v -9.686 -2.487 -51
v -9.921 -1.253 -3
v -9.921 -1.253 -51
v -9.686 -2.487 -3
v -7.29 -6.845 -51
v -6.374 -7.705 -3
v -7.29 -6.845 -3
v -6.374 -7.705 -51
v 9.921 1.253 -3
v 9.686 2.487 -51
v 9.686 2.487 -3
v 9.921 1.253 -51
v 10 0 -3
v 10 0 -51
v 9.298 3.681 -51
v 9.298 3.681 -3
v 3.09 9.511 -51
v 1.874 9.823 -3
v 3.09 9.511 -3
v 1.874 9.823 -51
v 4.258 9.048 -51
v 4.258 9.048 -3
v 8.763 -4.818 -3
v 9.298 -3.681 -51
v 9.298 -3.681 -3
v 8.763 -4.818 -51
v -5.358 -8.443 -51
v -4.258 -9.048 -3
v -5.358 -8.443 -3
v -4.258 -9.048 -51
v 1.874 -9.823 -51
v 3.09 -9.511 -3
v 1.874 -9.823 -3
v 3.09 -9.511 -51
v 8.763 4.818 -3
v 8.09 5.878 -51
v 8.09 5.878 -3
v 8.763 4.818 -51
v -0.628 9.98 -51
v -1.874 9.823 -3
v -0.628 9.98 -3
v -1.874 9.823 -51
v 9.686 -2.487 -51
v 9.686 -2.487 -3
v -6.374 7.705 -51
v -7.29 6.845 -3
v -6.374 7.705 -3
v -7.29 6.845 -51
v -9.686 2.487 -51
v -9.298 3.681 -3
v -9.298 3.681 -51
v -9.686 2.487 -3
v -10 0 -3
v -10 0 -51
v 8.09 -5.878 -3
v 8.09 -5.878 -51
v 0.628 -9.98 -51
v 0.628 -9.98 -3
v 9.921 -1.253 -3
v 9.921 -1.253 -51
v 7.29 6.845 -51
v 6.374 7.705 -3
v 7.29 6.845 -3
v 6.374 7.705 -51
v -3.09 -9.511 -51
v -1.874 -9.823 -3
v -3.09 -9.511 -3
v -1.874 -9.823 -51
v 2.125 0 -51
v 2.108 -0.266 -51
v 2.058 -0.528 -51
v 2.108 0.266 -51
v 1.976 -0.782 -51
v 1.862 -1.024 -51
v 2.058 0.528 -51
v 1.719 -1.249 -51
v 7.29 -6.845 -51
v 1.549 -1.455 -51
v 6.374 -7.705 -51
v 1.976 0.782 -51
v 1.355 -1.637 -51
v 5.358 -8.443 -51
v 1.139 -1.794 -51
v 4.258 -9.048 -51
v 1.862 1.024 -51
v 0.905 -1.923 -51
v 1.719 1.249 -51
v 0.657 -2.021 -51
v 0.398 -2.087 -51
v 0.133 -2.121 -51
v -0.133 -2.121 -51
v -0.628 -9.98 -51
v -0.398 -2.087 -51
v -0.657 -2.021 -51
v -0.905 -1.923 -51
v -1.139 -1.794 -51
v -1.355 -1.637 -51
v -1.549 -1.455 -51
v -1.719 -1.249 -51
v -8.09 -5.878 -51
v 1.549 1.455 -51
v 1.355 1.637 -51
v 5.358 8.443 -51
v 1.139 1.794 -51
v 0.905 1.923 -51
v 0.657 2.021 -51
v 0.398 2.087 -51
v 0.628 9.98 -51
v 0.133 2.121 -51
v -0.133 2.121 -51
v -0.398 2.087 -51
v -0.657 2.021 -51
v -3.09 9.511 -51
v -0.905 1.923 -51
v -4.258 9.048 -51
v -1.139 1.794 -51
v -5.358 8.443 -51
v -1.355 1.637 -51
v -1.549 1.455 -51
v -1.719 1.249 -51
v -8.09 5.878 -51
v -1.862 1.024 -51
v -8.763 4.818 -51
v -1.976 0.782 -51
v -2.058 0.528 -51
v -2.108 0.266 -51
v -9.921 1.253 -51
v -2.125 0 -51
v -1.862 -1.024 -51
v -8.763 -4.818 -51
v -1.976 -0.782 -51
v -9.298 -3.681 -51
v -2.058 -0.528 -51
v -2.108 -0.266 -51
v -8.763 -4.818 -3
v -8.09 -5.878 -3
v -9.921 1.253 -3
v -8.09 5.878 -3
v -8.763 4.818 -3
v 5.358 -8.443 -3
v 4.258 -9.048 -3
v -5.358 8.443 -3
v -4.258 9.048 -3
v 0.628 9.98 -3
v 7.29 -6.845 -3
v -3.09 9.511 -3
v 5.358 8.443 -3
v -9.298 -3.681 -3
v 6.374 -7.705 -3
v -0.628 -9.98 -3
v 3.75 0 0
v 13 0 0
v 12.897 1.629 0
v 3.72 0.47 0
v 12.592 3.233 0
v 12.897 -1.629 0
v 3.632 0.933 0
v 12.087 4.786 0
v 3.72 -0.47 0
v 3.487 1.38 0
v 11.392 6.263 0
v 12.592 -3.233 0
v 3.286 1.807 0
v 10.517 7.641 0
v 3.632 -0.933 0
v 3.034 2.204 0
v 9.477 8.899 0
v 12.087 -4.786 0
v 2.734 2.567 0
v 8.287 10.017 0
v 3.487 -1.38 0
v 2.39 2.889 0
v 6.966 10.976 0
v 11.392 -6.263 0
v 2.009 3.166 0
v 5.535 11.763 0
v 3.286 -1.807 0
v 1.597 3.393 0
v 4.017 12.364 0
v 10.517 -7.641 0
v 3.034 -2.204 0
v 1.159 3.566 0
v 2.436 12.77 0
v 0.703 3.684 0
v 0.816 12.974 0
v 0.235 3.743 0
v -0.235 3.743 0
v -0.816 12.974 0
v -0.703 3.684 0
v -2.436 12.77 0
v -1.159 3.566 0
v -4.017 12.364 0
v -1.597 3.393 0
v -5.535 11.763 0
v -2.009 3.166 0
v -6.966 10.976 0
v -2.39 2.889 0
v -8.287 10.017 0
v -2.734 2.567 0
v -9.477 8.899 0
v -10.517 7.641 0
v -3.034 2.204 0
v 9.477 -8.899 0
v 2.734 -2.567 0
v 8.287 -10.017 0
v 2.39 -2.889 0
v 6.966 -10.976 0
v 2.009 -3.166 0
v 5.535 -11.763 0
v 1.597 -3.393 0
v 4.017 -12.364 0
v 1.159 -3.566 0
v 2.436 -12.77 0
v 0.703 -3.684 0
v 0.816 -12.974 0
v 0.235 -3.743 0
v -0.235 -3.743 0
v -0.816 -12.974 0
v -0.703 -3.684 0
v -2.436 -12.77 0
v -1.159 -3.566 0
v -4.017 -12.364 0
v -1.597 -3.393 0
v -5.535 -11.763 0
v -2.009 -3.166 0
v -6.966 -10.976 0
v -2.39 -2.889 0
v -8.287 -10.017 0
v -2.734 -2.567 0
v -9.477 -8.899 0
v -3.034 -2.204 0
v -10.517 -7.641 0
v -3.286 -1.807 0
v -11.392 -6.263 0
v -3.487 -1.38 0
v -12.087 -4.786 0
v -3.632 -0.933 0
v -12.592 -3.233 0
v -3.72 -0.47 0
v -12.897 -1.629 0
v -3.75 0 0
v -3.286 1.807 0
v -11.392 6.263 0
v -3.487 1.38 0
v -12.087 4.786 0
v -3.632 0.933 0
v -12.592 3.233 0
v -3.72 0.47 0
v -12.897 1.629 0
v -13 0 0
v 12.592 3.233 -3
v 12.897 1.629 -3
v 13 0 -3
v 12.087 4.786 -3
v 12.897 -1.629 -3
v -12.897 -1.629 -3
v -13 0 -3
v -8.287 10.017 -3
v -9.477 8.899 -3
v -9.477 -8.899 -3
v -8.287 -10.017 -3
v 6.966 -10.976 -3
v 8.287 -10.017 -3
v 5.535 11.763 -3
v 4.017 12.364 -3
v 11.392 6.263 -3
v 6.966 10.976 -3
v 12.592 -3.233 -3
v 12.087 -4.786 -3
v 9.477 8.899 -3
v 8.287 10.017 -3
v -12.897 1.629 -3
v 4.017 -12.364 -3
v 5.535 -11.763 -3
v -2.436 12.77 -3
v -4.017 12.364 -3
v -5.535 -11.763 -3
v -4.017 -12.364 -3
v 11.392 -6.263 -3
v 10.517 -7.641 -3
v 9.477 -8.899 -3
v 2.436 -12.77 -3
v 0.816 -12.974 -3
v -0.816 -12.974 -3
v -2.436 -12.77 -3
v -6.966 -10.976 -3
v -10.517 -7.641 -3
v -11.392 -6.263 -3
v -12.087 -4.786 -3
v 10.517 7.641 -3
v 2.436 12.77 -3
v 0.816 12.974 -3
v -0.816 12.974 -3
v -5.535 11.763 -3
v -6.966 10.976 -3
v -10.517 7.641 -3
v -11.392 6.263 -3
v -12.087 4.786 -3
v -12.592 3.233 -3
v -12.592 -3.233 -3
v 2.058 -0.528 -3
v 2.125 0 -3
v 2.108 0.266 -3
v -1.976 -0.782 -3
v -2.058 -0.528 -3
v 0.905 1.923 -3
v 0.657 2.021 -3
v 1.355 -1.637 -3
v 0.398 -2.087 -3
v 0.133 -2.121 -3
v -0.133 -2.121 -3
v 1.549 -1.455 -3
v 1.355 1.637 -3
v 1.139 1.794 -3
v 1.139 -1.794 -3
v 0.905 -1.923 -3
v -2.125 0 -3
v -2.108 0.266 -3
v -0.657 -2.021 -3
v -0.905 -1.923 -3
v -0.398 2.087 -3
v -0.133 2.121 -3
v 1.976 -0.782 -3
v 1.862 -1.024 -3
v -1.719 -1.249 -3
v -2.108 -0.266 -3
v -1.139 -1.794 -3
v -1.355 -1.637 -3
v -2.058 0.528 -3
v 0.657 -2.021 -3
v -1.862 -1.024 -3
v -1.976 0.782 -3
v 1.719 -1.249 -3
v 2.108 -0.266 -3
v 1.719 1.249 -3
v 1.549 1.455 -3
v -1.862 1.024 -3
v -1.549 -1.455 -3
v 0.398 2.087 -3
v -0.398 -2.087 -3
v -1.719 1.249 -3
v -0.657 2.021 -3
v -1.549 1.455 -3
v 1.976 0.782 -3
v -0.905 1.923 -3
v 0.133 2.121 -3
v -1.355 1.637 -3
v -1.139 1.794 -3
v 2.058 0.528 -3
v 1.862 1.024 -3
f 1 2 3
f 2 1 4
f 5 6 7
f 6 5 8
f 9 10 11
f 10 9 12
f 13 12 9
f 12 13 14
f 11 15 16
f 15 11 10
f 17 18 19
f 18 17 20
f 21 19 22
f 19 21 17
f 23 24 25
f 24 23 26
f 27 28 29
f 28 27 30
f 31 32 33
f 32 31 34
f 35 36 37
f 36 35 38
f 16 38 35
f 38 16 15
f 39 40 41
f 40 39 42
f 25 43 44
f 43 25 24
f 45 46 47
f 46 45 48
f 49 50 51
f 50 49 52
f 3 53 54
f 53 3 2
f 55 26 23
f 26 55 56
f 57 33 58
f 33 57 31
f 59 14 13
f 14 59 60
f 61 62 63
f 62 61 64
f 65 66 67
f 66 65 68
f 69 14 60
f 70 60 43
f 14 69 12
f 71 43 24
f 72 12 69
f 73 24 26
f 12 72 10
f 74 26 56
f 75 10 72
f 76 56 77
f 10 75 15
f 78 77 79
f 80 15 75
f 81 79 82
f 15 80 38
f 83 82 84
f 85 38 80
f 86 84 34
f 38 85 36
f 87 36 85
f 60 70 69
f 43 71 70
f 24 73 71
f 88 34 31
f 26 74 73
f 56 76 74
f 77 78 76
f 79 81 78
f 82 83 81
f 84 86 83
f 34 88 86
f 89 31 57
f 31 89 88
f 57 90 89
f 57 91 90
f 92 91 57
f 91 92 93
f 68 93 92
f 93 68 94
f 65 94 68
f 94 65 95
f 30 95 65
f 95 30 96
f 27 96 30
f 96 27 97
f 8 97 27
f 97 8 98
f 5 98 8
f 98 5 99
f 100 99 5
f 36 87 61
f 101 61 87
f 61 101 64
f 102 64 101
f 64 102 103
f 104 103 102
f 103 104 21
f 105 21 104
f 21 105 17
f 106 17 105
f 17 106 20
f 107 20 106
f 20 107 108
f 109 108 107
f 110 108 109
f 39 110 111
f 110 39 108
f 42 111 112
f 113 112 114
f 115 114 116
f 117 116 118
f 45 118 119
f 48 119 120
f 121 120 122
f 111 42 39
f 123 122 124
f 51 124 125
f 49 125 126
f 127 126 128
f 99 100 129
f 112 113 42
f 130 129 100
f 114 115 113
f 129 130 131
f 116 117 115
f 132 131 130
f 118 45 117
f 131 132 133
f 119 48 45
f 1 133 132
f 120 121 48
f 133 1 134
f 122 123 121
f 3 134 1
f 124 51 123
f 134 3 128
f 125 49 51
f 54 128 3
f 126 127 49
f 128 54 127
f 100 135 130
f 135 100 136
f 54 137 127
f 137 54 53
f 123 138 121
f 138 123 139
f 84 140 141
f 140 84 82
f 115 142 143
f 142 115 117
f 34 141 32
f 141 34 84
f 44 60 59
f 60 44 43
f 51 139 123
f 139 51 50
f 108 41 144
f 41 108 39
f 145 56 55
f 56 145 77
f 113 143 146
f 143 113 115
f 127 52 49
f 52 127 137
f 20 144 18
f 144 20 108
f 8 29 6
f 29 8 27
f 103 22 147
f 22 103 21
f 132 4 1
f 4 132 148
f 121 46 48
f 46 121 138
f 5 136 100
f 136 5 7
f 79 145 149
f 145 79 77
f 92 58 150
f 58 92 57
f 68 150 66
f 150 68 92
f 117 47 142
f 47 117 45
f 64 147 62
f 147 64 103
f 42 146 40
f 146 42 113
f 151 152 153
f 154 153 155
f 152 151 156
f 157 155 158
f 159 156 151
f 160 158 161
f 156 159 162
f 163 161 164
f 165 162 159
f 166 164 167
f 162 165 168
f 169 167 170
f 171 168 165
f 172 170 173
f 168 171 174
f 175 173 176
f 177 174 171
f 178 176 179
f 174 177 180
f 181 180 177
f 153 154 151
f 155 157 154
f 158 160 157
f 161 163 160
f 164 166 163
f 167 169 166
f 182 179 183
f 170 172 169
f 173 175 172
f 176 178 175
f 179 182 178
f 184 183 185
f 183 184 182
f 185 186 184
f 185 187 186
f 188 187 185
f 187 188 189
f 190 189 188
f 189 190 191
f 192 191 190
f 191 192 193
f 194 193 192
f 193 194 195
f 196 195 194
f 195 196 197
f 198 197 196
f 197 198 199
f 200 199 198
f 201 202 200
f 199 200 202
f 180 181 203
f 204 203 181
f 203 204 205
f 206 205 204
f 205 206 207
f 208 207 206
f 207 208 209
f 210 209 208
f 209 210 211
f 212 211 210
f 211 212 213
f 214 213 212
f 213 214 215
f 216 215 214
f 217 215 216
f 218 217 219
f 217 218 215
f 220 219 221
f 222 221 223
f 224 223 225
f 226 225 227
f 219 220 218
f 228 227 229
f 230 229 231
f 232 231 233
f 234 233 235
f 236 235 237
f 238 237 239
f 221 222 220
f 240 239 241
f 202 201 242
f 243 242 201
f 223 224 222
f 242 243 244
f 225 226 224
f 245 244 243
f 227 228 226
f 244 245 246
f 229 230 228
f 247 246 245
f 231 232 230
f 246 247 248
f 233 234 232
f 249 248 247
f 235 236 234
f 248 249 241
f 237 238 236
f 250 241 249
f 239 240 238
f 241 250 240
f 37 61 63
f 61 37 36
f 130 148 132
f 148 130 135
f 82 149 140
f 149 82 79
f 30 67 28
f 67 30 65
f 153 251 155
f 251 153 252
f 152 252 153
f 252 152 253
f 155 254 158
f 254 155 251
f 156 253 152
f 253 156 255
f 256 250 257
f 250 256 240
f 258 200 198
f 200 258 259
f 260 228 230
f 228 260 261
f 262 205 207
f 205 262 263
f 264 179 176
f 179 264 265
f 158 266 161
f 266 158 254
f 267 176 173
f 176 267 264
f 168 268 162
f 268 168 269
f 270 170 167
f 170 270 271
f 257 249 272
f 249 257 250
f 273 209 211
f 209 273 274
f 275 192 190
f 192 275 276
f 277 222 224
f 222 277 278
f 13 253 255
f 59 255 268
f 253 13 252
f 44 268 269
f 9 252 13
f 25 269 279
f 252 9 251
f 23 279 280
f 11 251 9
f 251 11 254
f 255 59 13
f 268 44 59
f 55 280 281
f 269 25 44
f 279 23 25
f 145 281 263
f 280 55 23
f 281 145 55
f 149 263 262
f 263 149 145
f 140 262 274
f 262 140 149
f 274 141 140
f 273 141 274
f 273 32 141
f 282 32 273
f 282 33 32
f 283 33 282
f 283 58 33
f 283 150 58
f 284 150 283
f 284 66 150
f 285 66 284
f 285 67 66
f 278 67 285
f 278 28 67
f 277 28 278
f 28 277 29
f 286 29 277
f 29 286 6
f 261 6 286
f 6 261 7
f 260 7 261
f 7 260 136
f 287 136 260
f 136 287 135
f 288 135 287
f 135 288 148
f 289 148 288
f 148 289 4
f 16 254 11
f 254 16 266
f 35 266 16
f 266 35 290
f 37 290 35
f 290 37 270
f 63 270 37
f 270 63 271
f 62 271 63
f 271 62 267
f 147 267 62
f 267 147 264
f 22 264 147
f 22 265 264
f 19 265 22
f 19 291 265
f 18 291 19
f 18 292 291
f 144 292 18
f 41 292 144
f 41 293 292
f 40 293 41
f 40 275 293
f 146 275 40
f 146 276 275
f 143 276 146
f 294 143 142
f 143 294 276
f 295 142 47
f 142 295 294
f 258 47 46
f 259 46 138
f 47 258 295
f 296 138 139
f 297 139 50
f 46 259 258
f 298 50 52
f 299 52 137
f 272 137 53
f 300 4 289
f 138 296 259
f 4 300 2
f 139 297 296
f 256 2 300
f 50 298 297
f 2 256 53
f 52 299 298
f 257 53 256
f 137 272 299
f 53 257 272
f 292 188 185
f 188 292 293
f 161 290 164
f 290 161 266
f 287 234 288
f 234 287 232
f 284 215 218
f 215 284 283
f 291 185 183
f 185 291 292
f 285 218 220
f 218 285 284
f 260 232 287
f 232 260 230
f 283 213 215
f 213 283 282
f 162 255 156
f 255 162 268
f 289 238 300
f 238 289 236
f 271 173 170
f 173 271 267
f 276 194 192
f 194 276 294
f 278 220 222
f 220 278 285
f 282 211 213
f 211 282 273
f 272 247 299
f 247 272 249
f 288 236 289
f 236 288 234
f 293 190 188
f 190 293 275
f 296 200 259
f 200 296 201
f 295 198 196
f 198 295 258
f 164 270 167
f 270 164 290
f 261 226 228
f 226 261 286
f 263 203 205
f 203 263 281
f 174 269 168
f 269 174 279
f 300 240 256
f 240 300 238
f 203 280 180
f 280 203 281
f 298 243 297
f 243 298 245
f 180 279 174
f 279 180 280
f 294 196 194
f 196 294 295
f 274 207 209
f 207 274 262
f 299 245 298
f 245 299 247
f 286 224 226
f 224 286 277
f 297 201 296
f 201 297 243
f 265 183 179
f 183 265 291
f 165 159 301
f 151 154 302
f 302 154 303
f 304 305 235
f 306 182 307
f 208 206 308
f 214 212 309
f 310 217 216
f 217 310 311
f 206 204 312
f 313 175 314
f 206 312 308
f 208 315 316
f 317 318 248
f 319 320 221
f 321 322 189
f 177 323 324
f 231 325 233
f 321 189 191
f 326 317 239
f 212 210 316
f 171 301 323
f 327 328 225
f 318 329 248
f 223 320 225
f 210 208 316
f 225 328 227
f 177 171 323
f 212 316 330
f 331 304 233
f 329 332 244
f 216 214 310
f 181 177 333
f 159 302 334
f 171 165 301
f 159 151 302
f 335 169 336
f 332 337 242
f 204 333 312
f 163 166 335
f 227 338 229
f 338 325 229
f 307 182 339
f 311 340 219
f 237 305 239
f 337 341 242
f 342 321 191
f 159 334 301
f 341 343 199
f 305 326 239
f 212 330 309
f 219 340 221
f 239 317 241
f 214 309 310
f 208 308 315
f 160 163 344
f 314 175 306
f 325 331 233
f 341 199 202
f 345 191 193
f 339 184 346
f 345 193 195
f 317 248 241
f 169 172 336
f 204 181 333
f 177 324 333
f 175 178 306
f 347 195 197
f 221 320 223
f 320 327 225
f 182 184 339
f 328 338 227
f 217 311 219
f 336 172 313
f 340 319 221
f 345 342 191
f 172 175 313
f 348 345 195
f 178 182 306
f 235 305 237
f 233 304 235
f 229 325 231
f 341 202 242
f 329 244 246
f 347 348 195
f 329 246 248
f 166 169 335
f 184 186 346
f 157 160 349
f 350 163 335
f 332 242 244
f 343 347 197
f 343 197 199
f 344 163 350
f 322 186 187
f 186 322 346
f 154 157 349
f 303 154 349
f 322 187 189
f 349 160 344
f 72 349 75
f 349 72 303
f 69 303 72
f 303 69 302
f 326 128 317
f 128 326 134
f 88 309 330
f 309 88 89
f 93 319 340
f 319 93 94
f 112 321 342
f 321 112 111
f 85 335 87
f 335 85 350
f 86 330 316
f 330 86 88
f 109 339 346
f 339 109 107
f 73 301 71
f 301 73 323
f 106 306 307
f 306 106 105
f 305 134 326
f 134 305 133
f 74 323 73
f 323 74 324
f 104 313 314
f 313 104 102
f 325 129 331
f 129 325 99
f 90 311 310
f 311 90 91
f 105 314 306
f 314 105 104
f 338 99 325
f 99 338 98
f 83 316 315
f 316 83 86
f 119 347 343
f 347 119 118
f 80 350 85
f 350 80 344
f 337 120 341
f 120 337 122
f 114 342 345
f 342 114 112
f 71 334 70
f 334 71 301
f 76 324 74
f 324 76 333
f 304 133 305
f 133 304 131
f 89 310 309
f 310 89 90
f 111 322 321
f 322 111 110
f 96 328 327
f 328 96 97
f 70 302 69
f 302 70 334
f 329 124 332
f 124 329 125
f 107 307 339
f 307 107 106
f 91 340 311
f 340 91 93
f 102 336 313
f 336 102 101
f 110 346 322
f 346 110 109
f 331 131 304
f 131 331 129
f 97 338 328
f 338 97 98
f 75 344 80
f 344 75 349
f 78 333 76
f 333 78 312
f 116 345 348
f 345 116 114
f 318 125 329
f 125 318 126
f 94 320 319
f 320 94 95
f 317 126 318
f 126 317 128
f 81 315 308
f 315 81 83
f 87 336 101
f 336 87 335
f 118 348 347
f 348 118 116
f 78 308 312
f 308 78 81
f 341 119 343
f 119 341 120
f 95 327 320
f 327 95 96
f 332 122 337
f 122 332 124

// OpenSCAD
$fn = 50;


difference() {
	union() {
		translate(v = [0, 0, -51.0000000000]) {
			cylinder(h = 51, r = 10.0000000000);
		}
		translate(v = [0, 0, -3.0000000000]) {
			cylinder(h = 3, r = 13.0000000000);
		}
	}
	union() {
		translate(v = [0, 0, 0]) {
			rotate(a = [0, 0, 0]) {
				difference() {
					union() {
						#translate(v = [0, 0, -51.0000000000]) {
							cylinder(h = 51, r = 2.0000000000);
						}
						#translate(v = [0, 0, -3]) {
							cylinder(h = 3, r1 = 2.1250000000, r2 = 3.7500000000);
						}
						#translate(v = [0, 0, -51.0000000000]) {
							cylinder(h = 51, r = 2.1250000000);
						}
						#translate(v = [0, 0, -51.0000000000]) {
							cylinder(h = 51, r = 2.0000000000);
						}
					}
					union();
				}
			}
		}
	}
}
